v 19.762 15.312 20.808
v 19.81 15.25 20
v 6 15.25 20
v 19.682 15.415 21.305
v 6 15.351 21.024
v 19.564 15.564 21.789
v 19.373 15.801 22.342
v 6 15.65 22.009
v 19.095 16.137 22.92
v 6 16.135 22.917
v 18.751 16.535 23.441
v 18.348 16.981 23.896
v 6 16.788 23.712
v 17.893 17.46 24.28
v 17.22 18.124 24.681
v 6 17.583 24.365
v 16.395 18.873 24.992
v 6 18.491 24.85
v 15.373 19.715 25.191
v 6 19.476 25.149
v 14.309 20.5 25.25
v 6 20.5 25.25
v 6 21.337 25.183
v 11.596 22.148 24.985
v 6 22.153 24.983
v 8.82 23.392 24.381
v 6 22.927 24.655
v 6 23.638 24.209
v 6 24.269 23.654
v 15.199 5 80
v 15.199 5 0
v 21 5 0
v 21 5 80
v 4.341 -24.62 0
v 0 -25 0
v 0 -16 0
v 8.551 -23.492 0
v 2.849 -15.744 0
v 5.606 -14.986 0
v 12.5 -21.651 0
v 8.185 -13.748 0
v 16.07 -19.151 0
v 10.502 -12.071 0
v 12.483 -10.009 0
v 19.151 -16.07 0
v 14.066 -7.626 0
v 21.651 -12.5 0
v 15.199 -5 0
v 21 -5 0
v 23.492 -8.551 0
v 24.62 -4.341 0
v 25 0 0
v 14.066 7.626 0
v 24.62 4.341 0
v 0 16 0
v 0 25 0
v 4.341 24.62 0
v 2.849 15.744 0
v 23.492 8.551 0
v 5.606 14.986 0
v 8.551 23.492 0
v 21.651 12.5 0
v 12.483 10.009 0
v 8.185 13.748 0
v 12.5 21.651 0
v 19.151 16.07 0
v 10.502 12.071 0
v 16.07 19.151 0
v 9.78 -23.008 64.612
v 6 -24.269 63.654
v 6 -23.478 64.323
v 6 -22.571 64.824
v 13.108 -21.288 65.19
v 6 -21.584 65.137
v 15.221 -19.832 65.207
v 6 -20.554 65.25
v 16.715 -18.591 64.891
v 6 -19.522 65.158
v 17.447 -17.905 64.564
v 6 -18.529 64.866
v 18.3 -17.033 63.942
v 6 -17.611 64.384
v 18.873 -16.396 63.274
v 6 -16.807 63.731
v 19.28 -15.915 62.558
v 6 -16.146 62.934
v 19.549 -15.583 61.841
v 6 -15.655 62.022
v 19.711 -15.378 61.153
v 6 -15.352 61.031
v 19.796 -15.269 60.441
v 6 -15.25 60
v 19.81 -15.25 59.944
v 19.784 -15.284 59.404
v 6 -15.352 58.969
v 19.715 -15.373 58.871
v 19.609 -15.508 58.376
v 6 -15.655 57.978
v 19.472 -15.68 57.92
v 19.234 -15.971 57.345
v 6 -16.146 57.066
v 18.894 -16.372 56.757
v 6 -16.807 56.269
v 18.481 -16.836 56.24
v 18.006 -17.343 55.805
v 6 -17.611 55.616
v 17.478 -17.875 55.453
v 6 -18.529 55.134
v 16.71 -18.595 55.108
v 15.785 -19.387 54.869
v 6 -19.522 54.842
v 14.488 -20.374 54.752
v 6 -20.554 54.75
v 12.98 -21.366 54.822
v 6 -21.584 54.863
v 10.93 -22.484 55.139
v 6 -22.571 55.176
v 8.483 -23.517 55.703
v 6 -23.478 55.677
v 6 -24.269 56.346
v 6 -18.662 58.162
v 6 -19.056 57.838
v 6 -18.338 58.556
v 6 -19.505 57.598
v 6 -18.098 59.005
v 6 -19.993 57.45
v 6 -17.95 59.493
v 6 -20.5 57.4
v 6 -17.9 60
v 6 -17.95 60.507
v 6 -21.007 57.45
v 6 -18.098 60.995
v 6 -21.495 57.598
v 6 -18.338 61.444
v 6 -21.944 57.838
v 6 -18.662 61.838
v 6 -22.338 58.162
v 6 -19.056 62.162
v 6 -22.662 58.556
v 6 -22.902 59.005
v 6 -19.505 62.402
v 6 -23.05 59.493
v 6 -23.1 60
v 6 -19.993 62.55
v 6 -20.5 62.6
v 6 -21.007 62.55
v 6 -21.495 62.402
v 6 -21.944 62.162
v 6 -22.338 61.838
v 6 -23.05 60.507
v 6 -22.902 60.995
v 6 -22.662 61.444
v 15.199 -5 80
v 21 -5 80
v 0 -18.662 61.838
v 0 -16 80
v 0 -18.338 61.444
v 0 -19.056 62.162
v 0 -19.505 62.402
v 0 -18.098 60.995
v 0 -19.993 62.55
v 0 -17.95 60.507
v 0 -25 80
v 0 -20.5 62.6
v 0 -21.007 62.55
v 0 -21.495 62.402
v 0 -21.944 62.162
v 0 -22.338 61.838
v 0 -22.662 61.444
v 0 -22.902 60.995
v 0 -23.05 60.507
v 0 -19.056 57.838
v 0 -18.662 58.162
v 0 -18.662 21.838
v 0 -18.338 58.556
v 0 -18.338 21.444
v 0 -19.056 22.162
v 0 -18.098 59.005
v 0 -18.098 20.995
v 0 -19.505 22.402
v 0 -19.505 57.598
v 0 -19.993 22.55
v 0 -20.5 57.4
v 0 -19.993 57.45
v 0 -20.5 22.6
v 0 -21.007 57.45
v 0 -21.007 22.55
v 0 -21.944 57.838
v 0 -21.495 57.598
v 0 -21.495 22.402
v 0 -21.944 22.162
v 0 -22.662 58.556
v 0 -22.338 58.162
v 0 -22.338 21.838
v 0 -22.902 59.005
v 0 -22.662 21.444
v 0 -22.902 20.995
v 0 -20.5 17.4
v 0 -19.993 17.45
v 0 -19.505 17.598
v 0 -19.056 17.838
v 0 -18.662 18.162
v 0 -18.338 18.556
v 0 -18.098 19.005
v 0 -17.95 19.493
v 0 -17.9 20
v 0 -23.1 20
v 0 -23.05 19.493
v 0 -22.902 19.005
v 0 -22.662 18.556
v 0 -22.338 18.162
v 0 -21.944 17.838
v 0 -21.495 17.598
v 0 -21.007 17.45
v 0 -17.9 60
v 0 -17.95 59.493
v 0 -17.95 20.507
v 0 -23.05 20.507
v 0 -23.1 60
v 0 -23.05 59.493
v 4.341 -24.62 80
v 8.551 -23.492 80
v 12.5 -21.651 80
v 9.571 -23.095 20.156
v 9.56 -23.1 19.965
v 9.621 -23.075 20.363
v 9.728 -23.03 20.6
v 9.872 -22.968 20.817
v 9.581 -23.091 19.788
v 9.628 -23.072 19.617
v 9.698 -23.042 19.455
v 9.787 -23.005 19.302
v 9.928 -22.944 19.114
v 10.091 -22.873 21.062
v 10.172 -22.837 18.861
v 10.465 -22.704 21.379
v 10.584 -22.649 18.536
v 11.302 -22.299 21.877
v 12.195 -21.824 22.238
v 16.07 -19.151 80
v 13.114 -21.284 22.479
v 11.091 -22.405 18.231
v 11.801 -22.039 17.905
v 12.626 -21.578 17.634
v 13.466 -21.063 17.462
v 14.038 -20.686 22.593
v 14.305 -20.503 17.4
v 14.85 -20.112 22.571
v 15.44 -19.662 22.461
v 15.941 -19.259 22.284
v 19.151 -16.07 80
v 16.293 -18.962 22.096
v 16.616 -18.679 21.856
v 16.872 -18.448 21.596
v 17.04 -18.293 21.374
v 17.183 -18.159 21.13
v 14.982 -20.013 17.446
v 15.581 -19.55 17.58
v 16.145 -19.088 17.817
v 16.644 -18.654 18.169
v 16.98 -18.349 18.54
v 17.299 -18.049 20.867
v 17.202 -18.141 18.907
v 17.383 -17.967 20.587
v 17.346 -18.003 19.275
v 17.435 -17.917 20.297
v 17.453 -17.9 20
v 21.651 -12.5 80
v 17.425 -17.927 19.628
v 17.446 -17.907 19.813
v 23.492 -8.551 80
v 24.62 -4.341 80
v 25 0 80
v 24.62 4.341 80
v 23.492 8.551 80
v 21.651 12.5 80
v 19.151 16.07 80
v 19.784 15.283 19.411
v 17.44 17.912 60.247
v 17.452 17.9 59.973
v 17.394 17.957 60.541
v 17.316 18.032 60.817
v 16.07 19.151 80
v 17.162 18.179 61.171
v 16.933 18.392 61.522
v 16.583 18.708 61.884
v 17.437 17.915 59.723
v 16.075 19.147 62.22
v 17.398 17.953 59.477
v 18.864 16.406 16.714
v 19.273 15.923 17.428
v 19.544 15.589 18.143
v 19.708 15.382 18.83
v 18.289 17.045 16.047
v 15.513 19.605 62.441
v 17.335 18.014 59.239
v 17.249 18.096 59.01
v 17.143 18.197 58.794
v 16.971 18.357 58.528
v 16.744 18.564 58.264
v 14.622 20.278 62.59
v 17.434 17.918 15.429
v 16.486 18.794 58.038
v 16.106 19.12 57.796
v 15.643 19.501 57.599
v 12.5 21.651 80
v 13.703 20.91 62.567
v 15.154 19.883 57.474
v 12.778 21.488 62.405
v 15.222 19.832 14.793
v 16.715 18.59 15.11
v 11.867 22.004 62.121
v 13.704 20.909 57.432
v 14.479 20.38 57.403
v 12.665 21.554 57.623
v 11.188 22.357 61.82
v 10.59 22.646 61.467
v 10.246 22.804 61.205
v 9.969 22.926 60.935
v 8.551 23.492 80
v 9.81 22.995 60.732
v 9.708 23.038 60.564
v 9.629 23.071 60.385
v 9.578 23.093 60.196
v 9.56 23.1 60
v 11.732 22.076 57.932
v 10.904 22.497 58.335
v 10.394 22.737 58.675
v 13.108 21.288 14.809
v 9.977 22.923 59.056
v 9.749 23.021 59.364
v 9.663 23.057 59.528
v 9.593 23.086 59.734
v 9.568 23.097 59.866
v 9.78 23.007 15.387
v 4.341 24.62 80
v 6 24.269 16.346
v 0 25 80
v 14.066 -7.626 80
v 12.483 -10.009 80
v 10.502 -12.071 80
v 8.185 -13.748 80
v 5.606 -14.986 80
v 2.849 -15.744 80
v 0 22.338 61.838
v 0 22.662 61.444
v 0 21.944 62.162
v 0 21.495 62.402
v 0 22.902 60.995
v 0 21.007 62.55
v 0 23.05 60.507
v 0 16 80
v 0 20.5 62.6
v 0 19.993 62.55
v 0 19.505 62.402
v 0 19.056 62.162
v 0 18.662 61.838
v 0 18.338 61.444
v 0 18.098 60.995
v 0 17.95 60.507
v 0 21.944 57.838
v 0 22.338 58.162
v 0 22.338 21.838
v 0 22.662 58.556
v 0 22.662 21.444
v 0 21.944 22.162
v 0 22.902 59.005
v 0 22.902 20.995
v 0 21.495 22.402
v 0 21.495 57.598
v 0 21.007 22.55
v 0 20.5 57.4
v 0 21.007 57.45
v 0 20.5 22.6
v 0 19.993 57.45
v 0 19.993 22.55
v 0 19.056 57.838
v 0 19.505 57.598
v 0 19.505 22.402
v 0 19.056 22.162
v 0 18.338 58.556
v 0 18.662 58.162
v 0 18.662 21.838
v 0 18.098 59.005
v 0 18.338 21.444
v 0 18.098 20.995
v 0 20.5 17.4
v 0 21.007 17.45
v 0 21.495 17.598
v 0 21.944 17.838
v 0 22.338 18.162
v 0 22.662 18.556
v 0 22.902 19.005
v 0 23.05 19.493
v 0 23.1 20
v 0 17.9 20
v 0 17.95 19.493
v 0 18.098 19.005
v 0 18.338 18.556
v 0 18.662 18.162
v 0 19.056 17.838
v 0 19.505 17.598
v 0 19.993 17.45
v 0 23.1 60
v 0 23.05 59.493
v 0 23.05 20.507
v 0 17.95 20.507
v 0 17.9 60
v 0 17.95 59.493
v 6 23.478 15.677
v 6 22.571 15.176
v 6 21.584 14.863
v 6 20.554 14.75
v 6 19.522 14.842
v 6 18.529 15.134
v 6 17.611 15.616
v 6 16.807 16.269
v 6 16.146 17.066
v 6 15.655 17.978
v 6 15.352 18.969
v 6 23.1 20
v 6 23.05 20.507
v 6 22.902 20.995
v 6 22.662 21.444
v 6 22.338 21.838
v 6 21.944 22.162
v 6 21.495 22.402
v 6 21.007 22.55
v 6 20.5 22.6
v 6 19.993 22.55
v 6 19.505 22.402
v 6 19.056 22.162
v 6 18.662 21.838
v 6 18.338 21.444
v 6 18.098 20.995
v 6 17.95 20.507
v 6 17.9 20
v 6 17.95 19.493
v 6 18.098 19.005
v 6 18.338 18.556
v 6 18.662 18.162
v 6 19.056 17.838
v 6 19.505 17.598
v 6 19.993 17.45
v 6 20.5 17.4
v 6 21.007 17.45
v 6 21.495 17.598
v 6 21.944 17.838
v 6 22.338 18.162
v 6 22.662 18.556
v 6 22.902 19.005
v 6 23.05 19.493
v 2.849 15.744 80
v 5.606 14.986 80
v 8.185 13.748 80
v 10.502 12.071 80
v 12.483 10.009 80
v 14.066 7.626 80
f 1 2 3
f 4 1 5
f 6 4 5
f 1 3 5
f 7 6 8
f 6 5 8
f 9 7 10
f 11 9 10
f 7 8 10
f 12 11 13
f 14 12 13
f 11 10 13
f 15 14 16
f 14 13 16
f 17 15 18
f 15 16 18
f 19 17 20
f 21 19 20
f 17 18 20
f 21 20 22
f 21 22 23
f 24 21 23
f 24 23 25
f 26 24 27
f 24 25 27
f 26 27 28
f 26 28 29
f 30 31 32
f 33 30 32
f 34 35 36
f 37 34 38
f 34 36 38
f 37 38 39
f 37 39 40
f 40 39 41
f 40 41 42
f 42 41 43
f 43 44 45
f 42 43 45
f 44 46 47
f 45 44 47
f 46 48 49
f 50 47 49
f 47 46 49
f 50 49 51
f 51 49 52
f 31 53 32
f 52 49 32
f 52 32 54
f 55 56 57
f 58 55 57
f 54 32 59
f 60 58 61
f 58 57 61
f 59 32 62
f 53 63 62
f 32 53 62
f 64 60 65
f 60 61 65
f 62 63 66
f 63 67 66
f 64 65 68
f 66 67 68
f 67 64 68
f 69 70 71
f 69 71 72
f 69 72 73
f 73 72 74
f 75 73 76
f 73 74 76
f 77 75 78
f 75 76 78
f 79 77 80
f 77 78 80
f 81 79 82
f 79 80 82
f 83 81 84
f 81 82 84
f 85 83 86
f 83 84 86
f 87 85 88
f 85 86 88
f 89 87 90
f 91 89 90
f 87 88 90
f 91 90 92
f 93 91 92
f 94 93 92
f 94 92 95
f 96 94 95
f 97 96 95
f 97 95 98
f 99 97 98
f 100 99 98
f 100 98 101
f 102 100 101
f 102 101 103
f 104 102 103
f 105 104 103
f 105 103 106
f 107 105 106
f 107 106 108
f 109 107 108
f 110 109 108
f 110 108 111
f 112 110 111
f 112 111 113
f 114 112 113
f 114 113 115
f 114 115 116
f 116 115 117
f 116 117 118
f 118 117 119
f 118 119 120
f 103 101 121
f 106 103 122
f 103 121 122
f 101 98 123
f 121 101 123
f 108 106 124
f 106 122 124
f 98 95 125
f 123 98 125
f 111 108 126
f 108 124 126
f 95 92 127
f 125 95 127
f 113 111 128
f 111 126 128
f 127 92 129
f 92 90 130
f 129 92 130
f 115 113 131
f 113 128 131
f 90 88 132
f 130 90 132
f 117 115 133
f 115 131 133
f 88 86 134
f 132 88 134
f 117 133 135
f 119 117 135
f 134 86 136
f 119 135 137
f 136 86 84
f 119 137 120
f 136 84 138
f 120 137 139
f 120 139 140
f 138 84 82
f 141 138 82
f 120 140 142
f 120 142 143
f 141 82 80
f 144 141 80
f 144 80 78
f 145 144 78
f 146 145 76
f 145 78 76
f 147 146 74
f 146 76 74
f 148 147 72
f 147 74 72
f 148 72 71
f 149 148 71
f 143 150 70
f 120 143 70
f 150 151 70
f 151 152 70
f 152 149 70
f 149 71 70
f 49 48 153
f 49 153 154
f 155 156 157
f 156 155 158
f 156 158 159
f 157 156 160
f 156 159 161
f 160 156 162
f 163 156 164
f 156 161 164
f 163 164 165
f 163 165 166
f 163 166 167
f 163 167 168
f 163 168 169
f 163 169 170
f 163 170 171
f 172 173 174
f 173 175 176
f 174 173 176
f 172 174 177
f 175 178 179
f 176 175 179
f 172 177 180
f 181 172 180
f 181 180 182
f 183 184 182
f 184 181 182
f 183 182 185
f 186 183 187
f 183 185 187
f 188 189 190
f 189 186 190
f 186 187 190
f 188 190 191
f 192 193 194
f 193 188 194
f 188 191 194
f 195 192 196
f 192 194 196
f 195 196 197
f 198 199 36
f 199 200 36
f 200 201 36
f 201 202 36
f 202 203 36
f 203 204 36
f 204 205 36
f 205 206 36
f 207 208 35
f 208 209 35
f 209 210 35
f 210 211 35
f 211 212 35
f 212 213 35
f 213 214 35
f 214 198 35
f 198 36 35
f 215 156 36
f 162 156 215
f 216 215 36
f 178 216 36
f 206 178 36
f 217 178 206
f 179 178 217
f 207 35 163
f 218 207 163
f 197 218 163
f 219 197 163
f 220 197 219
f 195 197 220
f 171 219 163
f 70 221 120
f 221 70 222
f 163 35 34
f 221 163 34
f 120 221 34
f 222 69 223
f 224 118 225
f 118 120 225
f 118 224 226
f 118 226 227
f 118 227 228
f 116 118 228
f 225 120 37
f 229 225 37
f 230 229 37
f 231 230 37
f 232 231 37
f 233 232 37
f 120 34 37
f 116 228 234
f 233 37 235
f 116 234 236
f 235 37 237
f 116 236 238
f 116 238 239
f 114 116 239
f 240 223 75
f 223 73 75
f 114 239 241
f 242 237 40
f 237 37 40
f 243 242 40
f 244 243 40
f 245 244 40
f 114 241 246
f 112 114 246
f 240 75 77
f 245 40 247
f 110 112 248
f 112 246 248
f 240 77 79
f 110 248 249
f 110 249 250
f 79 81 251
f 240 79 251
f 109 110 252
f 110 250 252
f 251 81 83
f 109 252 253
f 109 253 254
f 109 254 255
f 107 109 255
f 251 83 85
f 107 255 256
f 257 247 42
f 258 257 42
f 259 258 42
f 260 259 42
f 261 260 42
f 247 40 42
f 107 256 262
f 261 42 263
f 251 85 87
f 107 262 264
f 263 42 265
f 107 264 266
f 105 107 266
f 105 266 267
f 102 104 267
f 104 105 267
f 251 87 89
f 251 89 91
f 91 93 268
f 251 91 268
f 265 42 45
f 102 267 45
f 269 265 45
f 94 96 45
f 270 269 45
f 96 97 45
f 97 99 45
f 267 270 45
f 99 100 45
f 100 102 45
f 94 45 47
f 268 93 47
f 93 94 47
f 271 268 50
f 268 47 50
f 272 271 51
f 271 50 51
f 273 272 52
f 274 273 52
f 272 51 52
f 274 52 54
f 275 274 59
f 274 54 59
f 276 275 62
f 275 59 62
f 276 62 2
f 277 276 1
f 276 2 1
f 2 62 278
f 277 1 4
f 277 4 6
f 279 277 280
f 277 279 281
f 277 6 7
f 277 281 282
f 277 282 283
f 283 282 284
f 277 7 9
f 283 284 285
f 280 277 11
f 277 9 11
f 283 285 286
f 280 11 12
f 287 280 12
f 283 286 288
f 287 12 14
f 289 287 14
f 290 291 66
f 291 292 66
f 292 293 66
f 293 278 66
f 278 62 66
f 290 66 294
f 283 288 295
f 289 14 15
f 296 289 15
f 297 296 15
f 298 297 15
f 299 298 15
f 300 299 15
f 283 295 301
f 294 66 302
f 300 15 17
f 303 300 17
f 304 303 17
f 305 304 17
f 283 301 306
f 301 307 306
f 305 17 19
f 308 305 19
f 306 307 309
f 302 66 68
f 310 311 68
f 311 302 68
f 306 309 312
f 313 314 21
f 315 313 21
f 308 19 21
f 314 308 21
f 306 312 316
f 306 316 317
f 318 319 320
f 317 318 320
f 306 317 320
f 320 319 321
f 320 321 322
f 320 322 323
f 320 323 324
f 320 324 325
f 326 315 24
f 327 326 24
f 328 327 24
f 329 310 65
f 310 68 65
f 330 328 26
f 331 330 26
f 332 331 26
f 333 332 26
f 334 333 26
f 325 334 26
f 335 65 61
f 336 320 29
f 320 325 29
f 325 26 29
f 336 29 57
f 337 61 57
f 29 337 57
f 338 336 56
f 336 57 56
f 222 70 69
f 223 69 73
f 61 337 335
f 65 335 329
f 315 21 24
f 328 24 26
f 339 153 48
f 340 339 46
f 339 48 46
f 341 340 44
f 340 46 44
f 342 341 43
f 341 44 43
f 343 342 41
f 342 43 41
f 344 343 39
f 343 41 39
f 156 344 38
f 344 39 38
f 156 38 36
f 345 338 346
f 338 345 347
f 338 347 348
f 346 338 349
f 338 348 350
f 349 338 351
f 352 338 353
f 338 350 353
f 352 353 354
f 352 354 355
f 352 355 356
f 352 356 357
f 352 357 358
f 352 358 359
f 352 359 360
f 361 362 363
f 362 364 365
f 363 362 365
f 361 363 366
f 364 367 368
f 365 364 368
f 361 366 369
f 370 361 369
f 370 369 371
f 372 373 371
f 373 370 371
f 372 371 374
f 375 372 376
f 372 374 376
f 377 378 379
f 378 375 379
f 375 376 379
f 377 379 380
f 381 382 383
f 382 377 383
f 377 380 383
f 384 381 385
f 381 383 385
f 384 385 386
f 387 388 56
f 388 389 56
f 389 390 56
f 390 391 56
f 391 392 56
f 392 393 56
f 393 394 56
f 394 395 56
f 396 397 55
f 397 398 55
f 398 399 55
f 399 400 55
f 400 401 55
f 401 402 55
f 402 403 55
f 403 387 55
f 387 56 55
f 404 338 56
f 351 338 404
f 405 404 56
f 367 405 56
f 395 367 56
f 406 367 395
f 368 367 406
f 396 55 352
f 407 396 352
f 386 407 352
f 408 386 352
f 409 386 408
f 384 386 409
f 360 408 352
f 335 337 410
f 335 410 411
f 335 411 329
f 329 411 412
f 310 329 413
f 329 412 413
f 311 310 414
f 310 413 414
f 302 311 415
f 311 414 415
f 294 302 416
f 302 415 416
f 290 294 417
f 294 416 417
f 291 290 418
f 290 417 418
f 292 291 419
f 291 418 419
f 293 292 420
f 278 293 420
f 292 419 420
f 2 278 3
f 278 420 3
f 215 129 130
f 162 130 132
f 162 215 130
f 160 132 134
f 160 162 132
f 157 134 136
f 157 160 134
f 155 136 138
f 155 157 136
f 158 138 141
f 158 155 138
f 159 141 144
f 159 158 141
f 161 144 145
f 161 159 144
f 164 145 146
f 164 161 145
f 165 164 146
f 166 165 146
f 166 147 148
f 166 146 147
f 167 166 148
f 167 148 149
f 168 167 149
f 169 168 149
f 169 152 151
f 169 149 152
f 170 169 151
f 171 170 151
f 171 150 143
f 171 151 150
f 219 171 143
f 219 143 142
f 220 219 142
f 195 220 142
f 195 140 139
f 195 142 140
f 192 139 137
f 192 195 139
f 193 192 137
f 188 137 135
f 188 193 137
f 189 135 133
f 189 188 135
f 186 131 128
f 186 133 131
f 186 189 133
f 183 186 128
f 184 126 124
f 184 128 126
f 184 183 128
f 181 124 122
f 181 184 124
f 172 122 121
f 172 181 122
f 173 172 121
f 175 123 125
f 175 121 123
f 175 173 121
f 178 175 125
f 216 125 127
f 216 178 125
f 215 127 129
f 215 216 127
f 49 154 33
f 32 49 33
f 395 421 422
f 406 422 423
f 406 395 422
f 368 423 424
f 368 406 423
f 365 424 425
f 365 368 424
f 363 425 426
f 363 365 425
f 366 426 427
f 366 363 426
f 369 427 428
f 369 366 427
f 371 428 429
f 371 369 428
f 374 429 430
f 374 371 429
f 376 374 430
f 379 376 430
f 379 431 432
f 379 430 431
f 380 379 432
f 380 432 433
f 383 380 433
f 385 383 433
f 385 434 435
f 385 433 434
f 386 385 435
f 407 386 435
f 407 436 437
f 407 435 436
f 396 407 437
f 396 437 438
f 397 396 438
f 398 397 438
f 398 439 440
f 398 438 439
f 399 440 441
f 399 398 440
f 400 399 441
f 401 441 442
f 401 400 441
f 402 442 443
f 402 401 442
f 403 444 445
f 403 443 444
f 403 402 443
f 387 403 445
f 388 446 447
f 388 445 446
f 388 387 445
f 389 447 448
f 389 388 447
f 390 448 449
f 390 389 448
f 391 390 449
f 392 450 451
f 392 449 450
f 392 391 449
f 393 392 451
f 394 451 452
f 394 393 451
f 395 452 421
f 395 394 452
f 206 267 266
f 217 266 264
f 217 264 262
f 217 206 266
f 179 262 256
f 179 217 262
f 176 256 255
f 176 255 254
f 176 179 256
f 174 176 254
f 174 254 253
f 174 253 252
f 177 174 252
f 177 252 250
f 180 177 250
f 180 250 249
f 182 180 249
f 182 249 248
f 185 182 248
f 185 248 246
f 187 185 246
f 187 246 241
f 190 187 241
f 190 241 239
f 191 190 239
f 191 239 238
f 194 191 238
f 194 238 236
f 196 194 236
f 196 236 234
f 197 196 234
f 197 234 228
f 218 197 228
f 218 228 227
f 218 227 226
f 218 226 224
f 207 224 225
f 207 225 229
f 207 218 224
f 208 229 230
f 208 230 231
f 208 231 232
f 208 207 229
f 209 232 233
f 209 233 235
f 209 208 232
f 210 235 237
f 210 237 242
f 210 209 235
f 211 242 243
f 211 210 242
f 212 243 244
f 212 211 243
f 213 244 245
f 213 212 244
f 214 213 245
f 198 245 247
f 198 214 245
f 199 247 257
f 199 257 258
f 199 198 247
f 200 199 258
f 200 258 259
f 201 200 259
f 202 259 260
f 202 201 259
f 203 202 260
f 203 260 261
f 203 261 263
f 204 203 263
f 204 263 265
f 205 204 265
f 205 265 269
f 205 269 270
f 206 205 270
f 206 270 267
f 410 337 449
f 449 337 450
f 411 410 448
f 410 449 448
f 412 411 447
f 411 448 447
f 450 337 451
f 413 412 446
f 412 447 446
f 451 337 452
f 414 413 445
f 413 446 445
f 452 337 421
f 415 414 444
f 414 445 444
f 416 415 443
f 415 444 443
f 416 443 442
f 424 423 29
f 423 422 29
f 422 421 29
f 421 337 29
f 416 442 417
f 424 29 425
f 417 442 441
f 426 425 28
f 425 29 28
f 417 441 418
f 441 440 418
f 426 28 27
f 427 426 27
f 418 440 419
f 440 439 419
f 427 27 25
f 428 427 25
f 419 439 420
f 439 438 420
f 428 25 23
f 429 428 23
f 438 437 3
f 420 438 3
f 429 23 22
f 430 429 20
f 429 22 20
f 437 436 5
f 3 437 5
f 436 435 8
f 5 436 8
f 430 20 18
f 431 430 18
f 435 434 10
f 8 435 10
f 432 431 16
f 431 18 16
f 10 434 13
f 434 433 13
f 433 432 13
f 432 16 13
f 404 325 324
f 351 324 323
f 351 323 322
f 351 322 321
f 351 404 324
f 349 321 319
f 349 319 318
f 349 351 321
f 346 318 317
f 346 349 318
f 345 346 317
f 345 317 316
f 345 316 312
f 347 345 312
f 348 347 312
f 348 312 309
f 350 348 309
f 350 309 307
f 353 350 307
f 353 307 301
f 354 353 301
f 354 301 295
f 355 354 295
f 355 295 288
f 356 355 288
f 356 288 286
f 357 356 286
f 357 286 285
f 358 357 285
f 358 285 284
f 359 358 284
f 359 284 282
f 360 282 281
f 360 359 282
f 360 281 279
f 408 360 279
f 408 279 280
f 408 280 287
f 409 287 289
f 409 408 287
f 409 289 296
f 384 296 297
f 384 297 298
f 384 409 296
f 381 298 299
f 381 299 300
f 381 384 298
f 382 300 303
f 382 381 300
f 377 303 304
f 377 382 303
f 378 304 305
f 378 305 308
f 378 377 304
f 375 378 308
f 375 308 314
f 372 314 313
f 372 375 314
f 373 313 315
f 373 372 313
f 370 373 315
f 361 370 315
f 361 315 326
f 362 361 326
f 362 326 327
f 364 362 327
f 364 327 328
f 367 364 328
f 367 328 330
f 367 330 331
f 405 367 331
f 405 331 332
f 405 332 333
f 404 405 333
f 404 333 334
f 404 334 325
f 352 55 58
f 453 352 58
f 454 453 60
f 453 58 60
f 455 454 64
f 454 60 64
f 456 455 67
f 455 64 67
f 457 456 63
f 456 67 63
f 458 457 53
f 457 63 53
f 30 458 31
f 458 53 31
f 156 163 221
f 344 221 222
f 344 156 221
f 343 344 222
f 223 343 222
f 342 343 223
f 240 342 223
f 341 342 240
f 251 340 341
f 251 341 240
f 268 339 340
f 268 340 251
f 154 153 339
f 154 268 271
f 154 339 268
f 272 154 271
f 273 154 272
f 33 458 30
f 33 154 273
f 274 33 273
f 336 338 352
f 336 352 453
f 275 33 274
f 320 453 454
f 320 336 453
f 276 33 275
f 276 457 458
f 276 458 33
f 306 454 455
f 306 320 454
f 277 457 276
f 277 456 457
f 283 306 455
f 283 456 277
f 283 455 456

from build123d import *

# Parameters (mm, degrees)
F1_DEPTH = 80
F2_R     = 2.6
F3_DEPTH = 25.001
F6_DEPTH = 25
F7_W     = 10
F7_H     = 10
F8_DEPTH = 80.0010001


with BuildPart() as f1:
    # F0 (on Top) → F1 (new body)
    with BuildSketch(Plane.XY):
        with BuildLine():
            Line((0, -16), (0, -25))
            ThreePointArc((0, -25), (25, 0), (0, 25))
            Line((0, 25), (0, 16))
            ThreePointArc((0, 16), (16, 0), (0, -16))
        make_face()
    extrude(amount=F1_DEPTH)

    # F2 (on Right) → F3 (cut, through all)
    with BuildSketch(Plane.YZ):
        with Locations((-20.5, 20)):
            Circle(F2_R)
        with Locations((-20.5, 60)):
            Circle(F2_R)
        with Locations((20.5, 60)):
            Circle(F2_R)
        with Locations((20.5, 20)):
            Circle(F2_R)
    extrude(amount=F3_DEPTH, mode=Mode.SUBTRACT)

    # F5 (on offset) → F6 (cut)
    with BuildSketch(Plane(origin=(6, 0, 0), x_dir=(0, -1, 0), z_dir=(-1, 0, 0))):
        with BuildLine():
            ThreePointArc((15.25, 60), (20.5, 54.75), (25.75, 60))
            ThreePointArc((25.75, 60), (20.5, 65.25), (15.25, 60))
        make_face()
        with BuildLine():
            ThreePointArc((-15.25, 20), (-16.7876893988, 23.7123106012), (-20.5, 25.25))
            ThreePointArc((-20.5, 25.25), (-24.2123106012, 16.2876893988), (-15.25, 20))
        make_face()
    extrude(amount=-F6_DEPTH, mode=Mode.SUBTRACT)

    # F7 (on Top) → F8 (cut, through all)
    with BuildSketch(Plane.XY):
        with Locations((16, 0)):
            Rectangle(F7_W, F7_H)
    extrude(amount=F8_DEPTH, mode=Mode.SUBTRACT)


solid = f1.part
